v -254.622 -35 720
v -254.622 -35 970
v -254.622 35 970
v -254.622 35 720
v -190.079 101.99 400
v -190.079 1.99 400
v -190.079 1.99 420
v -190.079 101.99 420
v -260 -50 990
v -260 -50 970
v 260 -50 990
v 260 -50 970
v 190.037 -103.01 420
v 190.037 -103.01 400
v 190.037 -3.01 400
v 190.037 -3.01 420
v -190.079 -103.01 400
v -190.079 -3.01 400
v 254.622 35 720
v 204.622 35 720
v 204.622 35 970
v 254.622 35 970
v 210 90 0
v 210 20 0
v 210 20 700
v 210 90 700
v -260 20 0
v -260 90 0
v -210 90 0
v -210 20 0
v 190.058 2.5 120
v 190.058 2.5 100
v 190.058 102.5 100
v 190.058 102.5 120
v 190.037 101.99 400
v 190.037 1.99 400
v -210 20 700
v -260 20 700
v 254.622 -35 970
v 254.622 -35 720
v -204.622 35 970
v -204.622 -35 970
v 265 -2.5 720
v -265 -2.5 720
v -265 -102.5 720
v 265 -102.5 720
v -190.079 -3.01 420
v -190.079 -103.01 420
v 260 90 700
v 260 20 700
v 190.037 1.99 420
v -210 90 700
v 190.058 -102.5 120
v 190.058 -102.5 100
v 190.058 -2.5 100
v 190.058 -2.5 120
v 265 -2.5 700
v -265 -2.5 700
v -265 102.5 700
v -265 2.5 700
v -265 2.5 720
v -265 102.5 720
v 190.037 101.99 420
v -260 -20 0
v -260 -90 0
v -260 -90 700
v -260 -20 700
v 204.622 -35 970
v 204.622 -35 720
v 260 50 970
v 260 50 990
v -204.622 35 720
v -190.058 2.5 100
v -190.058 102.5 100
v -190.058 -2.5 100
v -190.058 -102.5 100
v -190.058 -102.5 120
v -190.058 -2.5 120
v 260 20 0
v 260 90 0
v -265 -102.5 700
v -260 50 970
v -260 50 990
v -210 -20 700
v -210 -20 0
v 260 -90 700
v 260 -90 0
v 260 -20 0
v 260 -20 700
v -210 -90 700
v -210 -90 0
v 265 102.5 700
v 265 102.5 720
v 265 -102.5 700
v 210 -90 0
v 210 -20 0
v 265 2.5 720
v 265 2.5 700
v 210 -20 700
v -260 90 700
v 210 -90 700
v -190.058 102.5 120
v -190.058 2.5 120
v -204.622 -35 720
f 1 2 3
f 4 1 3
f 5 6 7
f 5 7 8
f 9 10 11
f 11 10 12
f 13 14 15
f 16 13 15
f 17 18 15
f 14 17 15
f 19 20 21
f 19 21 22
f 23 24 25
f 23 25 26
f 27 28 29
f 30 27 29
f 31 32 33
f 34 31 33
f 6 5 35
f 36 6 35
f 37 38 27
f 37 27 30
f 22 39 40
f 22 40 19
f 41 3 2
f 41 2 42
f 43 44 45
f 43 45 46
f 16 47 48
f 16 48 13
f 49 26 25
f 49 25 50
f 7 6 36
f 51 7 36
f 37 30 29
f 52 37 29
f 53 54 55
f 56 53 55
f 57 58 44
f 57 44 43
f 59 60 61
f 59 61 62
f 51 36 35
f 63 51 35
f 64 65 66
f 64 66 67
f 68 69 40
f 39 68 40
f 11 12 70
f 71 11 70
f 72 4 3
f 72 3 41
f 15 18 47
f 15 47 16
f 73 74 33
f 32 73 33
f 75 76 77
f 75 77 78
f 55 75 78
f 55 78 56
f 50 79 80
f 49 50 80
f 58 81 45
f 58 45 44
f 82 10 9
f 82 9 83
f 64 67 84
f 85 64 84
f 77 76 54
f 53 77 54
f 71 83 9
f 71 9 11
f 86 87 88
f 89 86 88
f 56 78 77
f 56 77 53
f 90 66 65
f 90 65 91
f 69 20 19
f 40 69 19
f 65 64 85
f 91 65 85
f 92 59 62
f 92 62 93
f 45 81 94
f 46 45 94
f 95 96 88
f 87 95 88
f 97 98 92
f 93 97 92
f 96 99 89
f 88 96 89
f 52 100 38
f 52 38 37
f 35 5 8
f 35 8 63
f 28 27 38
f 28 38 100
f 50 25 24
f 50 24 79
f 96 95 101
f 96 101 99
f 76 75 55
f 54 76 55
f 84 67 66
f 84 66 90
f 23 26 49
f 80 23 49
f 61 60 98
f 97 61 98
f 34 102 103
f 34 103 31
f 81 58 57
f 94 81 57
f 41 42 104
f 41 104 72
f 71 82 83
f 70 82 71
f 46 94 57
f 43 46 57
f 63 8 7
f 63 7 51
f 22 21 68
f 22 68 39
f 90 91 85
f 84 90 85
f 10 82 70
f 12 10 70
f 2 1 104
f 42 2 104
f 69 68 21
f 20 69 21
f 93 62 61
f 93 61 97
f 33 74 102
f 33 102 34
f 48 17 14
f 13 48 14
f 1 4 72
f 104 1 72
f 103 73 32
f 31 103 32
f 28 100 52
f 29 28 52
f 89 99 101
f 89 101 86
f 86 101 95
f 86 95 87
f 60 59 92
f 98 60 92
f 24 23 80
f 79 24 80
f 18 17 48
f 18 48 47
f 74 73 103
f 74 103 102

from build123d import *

# Parameters (mm, degrees)
F0_W      = 50
F0_H      = 70
F1_DEPTH  = 700
F2_W      = 530
F2_H      = 100
F3_DEPTH  = 20
F5_W      = 380.115924
F5_H      = 100
F6_DEPTH  = 20
F7_W      = 50
F7_H      = 70
F8_DEPTH  = 250
F9_W      = 520
F9_H      = 100
F10_DEPTH = 20
F12_W     = 380.115925
F12_H     = 100
F13_DEPTH = 20


with BuildPart() as f1:
    # F0 (on Top) → F1 (new body)
    with BuildSketch(Plane.XY):
        with Locations((-235, -55)):
            Rectangle(F0_W, F0_H)
        with Locations((-235, 55)):
            Rectangle(F0_W, F0_H)
        with Locations((235, 55)):
            Rectangle(F0_W, F0_H)
        with Locations((235, -55)):
            Rectangle(F0_W, F0_H)
    extrude(amount=F1_DEPTH)


with BuildPart() as f3:
    # F2 (on face) → F3 (new body)
    with BuildSketch(Plane.XY.offset(700)):
        with Locations((0, -52.5)):
            Rectangle(F2_W, F2_H)
        with Locations((0, 52.5)):
            Rectangle(F2_W, F2_H)
    extrude(amount=F3_DEPTH)


with BuildPart() as f6:
    # F5 (on offset) → F6 (new body)
    with BuildSketch(Plane.XY.offset(100)):
        with Locations((0, -52.5)):
            Rectangle(F5_W, F5_H)
        with Locations((0, 52.5)):
            Rectangle(F5_W, F5_H)
    extrude(amount=F6_DEPTH)


with BuildPart() as f8:
    # F7 (on face) → F8 (new body)
    with BuildSketch(Plane.XY.offset(720)):
        with Locations((-229.621953, 0)):
            Rectangle(F7_W, F7_H)
        with Locations((229.621953, 0)):
            Rectangle(F7_W, F7_H)
    extrude(amount=F8_DEPTH)


with BuildPart() as f10:
    # F9 (on face) → F10 (new body)
    with BuildSketch(Plane.XY.offset(970)):
        Rectangle(F9_W, F9_H)
    extrude(amount=F10_DEPTH)


with BuildPart() as f13:
    # F12 (on offset) → F13 (new body)
    with BuildSketch(Plane.XY.offset(400)):
        with Locations((-0.021234, -53.009988)):
            Rectangle(F12_W, F12_H)
        with Locations((-0.021234, 51.990012)):
            Rectangle(F12_W, F12_H)
    extrude(amount=F13_DEPTH)


solid = Compound([f1.part, f3.part, f6.part, f8.part, f10.part, f13.part])
